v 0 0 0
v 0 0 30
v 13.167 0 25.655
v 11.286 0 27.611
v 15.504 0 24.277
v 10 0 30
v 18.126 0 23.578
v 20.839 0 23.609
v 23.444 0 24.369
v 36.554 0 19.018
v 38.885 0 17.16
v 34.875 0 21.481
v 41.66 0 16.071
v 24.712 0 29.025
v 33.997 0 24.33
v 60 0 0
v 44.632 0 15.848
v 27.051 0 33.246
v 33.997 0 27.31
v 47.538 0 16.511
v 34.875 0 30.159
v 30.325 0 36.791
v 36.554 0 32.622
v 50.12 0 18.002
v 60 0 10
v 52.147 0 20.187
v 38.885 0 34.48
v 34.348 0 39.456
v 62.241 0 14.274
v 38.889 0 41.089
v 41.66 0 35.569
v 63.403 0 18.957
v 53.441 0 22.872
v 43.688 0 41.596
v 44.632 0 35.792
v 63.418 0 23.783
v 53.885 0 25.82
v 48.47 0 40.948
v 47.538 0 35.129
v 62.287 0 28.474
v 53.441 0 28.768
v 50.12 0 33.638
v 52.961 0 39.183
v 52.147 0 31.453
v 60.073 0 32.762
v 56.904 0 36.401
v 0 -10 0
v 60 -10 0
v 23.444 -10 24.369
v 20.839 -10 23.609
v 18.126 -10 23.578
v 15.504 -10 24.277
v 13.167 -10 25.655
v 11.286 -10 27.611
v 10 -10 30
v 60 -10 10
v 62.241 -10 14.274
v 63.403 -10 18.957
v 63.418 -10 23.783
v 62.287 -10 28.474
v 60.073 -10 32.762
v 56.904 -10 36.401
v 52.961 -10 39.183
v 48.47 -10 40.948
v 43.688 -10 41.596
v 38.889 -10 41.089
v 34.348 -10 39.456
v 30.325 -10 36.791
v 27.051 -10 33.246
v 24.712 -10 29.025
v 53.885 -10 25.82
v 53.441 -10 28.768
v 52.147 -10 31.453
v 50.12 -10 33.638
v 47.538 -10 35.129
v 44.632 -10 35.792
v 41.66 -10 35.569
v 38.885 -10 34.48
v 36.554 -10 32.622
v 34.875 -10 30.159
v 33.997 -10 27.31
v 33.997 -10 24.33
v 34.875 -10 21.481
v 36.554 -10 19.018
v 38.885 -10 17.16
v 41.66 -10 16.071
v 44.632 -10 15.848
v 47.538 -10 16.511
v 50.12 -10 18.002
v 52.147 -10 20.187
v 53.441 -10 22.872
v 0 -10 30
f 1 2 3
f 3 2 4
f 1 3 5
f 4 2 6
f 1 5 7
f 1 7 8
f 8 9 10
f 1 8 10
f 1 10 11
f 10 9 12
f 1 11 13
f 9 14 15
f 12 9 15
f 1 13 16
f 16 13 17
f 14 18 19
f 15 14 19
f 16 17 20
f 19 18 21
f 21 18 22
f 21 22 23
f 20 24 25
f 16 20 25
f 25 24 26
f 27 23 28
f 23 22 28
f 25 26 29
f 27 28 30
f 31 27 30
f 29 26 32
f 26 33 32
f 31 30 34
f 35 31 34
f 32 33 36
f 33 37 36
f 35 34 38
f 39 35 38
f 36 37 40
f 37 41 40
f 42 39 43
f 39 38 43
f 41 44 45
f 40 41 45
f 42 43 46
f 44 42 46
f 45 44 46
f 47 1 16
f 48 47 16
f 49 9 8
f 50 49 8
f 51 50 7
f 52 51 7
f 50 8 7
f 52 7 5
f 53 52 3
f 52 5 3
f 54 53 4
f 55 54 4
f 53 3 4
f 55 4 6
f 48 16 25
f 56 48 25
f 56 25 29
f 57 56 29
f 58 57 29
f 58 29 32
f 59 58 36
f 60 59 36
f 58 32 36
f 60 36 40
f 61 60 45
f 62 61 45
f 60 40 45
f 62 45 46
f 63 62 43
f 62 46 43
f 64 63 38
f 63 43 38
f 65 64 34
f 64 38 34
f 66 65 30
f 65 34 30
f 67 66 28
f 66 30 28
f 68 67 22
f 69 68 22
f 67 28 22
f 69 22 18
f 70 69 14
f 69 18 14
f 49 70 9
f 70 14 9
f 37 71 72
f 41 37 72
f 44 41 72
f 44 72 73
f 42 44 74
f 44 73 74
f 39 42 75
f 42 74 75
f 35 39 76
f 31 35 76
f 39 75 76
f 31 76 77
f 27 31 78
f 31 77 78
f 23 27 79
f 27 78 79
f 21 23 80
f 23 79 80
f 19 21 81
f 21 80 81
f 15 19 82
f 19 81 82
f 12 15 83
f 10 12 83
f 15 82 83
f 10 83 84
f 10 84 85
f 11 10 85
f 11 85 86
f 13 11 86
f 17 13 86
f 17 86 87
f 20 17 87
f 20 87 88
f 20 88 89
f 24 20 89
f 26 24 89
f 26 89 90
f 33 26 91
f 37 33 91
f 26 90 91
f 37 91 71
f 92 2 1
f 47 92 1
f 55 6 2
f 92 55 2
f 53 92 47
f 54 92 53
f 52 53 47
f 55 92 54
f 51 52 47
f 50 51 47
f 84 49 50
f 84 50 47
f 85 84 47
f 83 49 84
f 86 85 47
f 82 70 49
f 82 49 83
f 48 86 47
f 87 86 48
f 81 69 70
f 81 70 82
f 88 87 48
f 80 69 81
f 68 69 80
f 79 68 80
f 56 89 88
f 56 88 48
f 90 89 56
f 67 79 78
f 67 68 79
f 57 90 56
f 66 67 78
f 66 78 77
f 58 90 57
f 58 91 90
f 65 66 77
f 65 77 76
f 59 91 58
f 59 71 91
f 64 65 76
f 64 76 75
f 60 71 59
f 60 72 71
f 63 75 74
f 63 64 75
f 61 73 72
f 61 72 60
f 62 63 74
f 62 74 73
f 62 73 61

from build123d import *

# Parameters (mm, degrees)
F1_DEPTH = 10
F2_R     = 10
F3_DEPTH = 10


with BuildPart() as f1:
    # F0 (on Front) → F1 (new body)
    with BuildSketch(Plane.XZ):
        Polygon((0, 10), (0, 0), (60, 0), (60, 10), (26.784621, 10), align=None)
        with BuildLine():
            ThreePointArc((23.443592, 24.368972), (23.75282, 16.867964), (26.784621, 10))
            Line((26.784621, 10), (60, 10))
            ThreePointArc((60, 10), (50.768452, 40.200275), (23.443592, 24.368972))
        make_face()
        with BuildLine():
            Line((0, 30), (0, 10))
            Line((0, 10), (26.784621, 10))
            ThreePointArc((26.784621, 10), (23.75282, 16.867964), (23.443592, 24.368972))
            ThreePointArc((23.443592, 24.368972), (15.503914, 24.276899), (10, 30))
            Line((10, 30), (0, 30))
        make_face()
    extrude(amount=F1_DEPTH)

    # F2 (on face) → F3 (cut)
    with BuildSketch(Plane.XZ.offset(10)):
        with Locations((43.884981, 25.819998)):
            Circle(F2_R)
    extrude(amount=-F3_DEPTH, mode=Mode.SUBTRACT)


solid = f1.part
